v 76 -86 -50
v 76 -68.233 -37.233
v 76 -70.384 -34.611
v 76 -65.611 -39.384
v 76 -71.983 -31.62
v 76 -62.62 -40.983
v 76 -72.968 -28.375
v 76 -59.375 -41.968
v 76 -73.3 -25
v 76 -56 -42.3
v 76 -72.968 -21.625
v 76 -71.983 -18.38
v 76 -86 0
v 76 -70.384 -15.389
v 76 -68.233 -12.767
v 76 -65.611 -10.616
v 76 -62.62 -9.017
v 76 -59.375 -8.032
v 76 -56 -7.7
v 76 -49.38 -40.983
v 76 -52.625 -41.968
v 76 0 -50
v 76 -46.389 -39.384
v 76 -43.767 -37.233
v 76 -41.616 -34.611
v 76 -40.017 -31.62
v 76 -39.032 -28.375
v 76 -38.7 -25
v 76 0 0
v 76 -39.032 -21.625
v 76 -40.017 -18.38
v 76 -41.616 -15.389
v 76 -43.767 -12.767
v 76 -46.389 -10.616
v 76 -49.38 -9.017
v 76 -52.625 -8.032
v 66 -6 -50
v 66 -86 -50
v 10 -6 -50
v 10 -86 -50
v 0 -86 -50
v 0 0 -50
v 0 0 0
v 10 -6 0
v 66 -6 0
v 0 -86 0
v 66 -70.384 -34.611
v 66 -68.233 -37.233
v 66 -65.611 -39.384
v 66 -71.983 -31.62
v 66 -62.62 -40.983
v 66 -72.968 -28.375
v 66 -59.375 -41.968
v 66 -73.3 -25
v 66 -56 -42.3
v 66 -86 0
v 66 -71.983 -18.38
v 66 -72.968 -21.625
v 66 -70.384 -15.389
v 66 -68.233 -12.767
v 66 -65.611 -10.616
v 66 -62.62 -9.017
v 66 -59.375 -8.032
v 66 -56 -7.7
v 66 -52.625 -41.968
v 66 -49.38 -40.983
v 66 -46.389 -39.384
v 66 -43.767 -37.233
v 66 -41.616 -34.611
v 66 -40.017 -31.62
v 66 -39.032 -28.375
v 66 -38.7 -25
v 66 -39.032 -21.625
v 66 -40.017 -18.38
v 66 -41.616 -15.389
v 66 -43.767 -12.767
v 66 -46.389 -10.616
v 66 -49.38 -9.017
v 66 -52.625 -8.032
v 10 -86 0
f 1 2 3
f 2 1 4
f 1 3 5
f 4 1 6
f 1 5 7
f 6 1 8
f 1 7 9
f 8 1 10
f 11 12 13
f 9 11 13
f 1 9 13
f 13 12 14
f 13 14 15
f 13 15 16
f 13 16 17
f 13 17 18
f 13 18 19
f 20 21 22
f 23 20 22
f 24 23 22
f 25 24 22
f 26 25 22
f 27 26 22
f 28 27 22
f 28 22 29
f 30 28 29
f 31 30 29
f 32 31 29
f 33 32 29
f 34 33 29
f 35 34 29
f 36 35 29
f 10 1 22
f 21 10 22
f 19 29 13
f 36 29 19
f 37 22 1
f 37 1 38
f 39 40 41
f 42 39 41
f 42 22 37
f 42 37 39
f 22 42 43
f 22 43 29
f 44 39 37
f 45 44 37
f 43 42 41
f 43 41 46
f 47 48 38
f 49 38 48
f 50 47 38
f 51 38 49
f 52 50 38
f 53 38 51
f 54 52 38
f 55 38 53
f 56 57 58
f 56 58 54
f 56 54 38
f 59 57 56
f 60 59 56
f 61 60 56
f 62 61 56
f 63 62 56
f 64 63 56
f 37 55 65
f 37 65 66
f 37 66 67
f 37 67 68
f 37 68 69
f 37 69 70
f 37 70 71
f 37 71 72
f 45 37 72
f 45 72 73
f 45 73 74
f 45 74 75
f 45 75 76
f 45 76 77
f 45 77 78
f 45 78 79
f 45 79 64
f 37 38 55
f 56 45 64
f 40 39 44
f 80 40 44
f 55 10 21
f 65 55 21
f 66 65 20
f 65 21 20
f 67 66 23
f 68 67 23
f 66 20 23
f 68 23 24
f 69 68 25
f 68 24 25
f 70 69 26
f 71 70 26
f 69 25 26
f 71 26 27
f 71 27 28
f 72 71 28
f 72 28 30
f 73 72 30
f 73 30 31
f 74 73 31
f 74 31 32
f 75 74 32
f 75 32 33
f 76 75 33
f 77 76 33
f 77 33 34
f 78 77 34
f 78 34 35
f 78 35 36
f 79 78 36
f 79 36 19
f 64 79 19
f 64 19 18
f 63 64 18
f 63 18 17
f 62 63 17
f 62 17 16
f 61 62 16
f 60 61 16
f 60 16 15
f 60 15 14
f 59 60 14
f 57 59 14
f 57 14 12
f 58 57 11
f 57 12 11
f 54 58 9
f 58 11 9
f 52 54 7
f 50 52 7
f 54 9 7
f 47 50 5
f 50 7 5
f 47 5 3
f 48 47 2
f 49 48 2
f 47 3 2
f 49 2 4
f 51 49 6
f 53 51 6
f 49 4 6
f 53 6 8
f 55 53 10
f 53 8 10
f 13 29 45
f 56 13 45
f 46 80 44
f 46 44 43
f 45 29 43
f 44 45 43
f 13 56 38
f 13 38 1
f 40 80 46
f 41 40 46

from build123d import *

# Parameters (mm, degrees)
SKETCH1_W                     = 76
SKETCH1_H                     = 50
UAV_INTERFACE_TOP_DEPTH       = 6
SKETCH2_W                     = 10
SKETCH2_H                     = 50
SPOOL_AND_MOTOR_INSERTS_DEPTH = 80
SKETCH3_R                     = 17.3
MOTOR_CUTOUT_DEPTH            = 30


with BuildPart() as part:
    # Sketch1 → UAV Interface Top (new body)
    with BuildSketch(Plane(origin=(0, 0, 0), x_dir=(1, 0, 0), z_dir=(0, 1, 0))):
        with Locations((38, 25)):
            Rectangle(SKETCH1_W, SKETCH1_H)
    extrude(amount=-UAV_INTERFACE_TOP_DEPTH)

    # Sketch2 → Spool and Motor Inserts (add)
    with BuildSketch(Plane.XZ.offset(6)):
        with Locations((71, -25)):
            Rectangle(SKETCH2_W, SKETCH2_H)
    extrude(amount=SPOOL_AND_MOTOR_INSERTS_DEPTH)

    # Mirror1: part across plane


with BuildPart() as part_1:
    add(part.part)
    add(part.part.mirror(Plane(origin=(38, 0, 0), x_dir=(0, 0, 1), z_dir=(1, 0, 0))))

    # Sketch3 → Motor Cutout (cut)
    with BuildSketch(Plane(origin=(76, 0, 0), x_dir=(0, 0, -1), z_dir=(1, 0, 0))):
        with Locations((25, -56)):
            Circle(SKETCH3_R)
    extrude(amount=-MOTOR_CUTOUT_DEPTH, mode=Mode.SUBTRACT)


solid = part_1.part
